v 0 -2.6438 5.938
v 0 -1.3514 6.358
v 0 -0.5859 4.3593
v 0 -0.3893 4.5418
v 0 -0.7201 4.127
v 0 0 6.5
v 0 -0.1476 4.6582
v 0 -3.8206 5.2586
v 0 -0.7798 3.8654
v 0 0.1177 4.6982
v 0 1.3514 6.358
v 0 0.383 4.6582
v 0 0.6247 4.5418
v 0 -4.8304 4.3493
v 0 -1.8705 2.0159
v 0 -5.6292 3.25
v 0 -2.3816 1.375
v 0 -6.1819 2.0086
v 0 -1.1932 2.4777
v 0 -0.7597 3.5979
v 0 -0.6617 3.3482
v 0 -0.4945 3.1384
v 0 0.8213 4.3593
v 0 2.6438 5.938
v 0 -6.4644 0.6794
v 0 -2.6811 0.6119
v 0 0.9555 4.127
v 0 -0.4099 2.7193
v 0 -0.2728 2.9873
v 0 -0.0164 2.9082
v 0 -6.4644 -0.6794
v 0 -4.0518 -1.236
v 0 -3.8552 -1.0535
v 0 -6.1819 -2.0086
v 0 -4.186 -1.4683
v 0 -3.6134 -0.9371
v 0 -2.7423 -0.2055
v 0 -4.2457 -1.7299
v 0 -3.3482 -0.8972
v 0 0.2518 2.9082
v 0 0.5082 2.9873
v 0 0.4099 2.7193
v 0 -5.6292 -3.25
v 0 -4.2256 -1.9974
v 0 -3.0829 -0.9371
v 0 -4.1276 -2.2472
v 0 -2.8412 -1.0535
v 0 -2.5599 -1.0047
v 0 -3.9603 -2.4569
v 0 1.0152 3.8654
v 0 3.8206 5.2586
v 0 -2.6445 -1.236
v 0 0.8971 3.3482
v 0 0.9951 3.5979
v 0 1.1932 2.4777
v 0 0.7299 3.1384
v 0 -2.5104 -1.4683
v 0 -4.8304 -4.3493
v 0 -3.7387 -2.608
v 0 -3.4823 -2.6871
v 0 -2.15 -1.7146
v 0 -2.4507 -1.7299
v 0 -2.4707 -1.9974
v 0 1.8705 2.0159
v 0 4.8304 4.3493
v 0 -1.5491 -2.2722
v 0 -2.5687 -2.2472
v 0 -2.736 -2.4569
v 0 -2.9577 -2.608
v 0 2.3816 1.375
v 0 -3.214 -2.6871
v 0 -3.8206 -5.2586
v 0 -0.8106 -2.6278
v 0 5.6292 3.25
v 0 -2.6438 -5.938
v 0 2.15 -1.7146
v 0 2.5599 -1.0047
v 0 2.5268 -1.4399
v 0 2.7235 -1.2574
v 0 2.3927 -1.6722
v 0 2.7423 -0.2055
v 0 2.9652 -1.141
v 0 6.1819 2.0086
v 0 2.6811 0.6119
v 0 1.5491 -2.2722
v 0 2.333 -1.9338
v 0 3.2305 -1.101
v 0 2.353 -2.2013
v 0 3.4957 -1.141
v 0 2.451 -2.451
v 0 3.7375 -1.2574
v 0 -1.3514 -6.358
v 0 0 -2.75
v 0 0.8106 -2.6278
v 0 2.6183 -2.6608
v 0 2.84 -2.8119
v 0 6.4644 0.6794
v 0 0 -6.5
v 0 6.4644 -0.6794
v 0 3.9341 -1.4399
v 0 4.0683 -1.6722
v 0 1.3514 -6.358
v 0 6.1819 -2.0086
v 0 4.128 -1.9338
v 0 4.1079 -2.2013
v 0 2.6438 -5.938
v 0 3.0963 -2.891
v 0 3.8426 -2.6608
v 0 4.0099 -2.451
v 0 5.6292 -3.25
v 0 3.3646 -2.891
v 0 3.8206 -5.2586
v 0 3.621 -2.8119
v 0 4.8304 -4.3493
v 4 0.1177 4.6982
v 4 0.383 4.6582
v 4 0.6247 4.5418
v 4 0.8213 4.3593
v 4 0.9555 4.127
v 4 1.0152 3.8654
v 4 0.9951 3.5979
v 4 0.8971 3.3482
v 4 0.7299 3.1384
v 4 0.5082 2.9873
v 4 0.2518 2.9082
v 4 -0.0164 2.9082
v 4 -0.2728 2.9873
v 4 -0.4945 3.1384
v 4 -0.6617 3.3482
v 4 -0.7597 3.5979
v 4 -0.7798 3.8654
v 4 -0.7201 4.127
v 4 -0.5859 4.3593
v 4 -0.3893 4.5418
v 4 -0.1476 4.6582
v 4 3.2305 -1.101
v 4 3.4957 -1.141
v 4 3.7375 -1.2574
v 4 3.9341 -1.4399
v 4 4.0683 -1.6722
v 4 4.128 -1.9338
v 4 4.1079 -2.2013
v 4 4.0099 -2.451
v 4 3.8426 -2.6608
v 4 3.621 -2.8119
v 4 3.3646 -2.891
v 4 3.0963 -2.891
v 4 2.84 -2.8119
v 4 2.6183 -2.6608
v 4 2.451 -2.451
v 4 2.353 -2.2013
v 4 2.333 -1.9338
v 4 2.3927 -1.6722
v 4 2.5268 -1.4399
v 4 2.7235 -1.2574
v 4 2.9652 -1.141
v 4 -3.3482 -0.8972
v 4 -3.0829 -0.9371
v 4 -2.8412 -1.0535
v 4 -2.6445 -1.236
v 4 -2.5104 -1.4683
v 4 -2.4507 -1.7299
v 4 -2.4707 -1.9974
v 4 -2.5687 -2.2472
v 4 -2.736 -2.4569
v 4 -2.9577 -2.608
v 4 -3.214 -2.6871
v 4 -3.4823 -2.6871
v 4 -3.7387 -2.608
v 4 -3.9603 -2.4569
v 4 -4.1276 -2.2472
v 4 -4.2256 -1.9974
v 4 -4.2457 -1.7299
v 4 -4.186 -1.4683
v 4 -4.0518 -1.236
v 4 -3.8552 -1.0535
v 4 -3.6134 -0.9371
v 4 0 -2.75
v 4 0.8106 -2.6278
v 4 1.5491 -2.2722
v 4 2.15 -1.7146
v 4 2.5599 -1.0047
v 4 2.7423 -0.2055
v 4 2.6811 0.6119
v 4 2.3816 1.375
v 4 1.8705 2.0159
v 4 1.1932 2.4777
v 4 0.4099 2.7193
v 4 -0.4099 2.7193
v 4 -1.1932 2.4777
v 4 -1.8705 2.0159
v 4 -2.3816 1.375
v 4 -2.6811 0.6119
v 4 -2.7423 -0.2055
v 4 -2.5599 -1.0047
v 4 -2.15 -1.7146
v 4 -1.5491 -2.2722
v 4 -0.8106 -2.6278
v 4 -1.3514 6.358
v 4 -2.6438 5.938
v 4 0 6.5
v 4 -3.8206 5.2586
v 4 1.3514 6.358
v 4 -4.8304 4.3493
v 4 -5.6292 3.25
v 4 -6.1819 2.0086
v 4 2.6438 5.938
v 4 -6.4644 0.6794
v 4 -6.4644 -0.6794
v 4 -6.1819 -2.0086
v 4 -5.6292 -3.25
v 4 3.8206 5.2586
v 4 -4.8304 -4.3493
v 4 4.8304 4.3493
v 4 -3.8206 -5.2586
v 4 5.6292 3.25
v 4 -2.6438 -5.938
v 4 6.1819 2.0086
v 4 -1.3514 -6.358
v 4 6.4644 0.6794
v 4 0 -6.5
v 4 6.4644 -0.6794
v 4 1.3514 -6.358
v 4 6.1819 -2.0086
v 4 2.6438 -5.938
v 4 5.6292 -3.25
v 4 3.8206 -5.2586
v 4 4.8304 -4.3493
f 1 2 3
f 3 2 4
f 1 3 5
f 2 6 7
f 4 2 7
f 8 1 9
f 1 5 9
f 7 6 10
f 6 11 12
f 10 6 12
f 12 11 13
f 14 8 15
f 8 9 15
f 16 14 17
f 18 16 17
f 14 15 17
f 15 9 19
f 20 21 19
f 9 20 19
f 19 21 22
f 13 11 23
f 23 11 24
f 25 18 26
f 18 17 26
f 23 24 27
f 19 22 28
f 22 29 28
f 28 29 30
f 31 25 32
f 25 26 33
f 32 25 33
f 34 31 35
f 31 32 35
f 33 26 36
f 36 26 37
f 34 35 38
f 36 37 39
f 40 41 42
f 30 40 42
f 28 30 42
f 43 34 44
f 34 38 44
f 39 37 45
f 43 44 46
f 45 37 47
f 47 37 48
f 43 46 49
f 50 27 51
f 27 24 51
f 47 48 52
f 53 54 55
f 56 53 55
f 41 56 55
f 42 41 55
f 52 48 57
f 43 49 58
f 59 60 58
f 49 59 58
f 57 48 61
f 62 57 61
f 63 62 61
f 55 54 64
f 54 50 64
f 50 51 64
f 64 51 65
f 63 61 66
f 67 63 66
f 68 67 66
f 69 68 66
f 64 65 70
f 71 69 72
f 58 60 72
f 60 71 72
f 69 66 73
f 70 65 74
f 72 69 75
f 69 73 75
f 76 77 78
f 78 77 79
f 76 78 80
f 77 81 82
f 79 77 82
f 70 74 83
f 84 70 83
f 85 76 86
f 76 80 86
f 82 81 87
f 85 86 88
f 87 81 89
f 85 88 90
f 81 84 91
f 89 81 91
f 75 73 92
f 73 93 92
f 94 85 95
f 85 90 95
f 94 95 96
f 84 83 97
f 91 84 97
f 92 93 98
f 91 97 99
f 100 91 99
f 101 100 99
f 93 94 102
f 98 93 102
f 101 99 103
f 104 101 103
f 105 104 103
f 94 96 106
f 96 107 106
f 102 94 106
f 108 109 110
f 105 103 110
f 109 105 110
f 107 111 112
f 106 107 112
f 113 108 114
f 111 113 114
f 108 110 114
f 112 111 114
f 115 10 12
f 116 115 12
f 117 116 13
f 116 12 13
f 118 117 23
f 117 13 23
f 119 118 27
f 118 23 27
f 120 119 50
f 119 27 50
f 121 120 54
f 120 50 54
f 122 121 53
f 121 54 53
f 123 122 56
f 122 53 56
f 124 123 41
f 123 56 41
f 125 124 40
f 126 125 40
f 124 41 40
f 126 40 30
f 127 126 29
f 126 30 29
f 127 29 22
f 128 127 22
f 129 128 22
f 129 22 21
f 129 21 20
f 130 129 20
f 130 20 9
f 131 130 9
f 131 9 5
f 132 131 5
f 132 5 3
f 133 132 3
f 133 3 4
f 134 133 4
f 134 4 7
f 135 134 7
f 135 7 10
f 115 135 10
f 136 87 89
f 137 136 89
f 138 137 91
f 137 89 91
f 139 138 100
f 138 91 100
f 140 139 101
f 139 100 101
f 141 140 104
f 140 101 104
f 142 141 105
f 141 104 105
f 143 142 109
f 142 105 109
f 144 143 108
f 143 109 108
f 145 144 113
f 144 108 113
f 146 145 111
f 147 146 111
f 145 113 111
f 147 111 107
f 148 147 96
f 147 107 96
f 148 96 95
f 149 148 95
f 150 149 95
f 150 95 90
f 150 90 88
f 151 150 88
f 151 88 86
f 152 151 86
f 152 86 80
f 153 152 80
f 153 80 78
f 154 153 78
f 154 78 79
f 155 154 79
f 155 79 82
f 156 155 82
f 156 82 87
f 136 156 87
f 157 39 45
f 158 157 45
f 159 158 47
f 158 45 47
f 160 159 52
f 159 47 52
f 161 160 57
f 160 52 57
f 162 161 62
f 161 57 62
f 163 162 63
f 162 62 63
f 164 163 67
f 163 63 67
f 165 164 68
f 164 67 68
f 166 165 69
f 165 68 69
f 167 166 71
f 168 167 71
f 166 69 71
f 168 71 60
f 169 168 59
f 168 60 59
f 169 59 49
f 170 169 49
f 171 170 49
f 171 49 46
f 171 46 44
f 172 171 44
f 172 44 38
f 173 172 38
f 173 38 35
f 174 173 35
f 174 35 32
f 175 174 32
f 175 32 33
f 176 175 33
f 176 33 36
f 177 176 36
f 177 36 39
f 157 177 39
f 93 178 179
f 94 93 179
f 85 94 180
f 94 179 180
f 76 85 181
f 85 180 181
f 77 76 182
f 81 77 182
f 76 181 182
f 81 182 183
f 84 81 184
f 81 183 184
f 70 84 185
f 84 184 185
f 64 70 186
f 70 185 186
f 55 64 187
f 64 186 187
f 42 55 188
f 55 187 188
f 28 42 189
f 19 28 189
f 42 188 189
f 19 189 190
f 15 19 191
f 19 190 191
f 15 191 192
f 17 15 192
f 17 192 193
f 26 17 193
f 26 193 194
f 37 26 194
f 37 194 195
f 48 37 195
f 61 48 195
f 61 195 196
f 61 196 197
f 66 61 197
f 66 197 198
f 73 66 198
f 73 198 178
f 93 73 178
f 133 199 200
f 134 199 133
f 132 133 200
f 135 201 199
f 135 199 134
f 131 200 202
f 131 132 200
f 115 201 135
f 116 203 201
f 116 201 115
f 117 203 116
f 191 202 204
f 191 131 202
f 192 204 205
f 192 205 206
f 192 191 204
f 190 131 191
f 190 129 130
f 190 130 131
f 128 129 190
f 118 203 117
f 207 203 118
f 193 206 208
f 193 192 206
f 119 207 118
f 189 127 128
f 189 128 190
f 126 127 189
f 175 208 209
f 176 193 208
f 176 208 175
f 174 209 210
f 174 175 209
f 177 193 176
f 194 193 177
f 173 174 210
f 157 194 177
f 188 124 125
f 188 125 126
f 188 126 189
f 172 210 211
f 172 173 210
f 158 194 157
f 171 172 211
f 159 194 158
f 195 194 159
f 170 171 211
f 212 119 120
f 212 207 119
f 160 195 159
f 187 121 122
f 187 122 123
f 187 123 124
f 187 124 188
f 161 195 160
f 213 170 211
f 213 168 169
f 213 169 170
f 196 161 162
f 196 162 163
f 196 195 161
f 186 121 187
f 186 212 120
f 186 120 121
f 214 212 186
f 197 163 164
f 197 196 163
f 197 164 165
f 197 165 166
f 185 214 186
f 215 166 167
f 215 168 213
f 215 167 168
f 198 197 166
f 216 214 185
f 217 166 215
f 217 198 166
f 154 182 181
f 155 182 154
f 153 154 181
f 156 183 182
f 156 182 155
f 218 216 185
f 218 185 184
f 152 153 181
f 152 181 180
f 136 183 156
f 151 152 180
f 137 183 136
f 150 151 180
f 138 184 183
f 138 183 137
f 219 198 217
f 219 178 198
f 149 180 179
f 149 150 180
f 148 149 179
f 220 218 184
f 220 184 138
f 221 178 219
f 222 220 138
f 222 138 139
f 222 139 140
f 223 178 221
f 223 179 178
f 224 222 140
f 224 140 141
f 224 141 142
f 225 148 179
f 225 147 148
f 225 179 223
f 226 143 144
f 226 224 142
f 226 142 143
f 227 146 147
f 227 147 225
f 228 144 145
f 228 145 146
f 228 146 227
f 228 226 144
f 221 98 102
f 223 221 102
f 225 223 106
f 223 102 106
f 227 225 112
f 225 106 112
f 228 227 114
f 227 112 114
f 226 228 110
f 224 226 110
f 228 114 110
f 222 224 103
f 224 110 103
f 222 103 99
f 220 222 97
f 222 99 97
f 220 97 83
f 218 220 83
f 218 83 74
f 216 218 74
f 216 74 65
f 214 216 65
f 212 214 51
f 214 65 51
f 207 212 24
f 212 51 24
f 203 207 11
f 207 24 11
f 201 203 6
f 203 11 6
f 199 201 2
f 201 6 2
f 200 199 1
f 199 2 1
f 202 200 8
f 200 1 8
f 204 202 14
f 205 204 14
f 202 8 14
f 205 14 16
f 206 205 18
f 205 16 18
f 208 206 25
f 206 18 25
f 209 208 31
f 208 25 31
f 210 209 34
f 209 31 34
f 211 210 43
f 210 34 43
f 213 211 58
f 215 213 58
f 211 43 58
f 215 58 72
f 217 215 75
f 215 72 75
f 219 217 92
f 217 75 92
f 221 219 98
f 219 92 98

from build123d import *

# Parameters (mm, degrees)
SKETCH1_R           = 6.5
BOSS_EXTRUDE1_DEPTH = 4
SKETCH2_R           = 2.75
CUT_EXTRUDE1_DEPTH  = 7
SKETCH3_R           = 0.9
CUT_EXTRUDE2_DEPTH  = 7


with BuildPart() as part:
    # Sketch1 → Boss-Extrude1 (new body)
    with BuildSketch(Plane(origin=(0, 0, 0), x_dir=(0, 0, -1), z_dir=(1, 0, 0))):
        Circle(SKETCH1_R)
    extrude(amount=BOSS_EXTRUDE1_DEPTH)

    # Sketch2 → Cut-Extrude1 (cut)
    with BuildSketch(Plane(origin=(4, 0, 0), x_dir=(0, 0, -1), z_dir=(1, 0, 0))):
        Circle(SKETCH2_R)
    extrude(amount=-CUT_EXTRUDE1_DEPTH, mode=Mode.SUBTRACT)

    # Sketch3 → Cut-Extrude2 (cut)
    with BuildSketch(Plane.ZY):
        with Locations((-2.001020721, 3.230466851)):
            Circle(SKETCH3_R)
        with Locations((3.798176719, 0.117701352)):
            Circle(SKETCH3_R)
        with Locations((-1.797155999, -3.348168203)):
            Circle(SKETCH3_R)
    extrude(amount=-CUT_EXTRUDE2_DEPTH, mode=Mode.SUBTRACT)


solid = part.part
